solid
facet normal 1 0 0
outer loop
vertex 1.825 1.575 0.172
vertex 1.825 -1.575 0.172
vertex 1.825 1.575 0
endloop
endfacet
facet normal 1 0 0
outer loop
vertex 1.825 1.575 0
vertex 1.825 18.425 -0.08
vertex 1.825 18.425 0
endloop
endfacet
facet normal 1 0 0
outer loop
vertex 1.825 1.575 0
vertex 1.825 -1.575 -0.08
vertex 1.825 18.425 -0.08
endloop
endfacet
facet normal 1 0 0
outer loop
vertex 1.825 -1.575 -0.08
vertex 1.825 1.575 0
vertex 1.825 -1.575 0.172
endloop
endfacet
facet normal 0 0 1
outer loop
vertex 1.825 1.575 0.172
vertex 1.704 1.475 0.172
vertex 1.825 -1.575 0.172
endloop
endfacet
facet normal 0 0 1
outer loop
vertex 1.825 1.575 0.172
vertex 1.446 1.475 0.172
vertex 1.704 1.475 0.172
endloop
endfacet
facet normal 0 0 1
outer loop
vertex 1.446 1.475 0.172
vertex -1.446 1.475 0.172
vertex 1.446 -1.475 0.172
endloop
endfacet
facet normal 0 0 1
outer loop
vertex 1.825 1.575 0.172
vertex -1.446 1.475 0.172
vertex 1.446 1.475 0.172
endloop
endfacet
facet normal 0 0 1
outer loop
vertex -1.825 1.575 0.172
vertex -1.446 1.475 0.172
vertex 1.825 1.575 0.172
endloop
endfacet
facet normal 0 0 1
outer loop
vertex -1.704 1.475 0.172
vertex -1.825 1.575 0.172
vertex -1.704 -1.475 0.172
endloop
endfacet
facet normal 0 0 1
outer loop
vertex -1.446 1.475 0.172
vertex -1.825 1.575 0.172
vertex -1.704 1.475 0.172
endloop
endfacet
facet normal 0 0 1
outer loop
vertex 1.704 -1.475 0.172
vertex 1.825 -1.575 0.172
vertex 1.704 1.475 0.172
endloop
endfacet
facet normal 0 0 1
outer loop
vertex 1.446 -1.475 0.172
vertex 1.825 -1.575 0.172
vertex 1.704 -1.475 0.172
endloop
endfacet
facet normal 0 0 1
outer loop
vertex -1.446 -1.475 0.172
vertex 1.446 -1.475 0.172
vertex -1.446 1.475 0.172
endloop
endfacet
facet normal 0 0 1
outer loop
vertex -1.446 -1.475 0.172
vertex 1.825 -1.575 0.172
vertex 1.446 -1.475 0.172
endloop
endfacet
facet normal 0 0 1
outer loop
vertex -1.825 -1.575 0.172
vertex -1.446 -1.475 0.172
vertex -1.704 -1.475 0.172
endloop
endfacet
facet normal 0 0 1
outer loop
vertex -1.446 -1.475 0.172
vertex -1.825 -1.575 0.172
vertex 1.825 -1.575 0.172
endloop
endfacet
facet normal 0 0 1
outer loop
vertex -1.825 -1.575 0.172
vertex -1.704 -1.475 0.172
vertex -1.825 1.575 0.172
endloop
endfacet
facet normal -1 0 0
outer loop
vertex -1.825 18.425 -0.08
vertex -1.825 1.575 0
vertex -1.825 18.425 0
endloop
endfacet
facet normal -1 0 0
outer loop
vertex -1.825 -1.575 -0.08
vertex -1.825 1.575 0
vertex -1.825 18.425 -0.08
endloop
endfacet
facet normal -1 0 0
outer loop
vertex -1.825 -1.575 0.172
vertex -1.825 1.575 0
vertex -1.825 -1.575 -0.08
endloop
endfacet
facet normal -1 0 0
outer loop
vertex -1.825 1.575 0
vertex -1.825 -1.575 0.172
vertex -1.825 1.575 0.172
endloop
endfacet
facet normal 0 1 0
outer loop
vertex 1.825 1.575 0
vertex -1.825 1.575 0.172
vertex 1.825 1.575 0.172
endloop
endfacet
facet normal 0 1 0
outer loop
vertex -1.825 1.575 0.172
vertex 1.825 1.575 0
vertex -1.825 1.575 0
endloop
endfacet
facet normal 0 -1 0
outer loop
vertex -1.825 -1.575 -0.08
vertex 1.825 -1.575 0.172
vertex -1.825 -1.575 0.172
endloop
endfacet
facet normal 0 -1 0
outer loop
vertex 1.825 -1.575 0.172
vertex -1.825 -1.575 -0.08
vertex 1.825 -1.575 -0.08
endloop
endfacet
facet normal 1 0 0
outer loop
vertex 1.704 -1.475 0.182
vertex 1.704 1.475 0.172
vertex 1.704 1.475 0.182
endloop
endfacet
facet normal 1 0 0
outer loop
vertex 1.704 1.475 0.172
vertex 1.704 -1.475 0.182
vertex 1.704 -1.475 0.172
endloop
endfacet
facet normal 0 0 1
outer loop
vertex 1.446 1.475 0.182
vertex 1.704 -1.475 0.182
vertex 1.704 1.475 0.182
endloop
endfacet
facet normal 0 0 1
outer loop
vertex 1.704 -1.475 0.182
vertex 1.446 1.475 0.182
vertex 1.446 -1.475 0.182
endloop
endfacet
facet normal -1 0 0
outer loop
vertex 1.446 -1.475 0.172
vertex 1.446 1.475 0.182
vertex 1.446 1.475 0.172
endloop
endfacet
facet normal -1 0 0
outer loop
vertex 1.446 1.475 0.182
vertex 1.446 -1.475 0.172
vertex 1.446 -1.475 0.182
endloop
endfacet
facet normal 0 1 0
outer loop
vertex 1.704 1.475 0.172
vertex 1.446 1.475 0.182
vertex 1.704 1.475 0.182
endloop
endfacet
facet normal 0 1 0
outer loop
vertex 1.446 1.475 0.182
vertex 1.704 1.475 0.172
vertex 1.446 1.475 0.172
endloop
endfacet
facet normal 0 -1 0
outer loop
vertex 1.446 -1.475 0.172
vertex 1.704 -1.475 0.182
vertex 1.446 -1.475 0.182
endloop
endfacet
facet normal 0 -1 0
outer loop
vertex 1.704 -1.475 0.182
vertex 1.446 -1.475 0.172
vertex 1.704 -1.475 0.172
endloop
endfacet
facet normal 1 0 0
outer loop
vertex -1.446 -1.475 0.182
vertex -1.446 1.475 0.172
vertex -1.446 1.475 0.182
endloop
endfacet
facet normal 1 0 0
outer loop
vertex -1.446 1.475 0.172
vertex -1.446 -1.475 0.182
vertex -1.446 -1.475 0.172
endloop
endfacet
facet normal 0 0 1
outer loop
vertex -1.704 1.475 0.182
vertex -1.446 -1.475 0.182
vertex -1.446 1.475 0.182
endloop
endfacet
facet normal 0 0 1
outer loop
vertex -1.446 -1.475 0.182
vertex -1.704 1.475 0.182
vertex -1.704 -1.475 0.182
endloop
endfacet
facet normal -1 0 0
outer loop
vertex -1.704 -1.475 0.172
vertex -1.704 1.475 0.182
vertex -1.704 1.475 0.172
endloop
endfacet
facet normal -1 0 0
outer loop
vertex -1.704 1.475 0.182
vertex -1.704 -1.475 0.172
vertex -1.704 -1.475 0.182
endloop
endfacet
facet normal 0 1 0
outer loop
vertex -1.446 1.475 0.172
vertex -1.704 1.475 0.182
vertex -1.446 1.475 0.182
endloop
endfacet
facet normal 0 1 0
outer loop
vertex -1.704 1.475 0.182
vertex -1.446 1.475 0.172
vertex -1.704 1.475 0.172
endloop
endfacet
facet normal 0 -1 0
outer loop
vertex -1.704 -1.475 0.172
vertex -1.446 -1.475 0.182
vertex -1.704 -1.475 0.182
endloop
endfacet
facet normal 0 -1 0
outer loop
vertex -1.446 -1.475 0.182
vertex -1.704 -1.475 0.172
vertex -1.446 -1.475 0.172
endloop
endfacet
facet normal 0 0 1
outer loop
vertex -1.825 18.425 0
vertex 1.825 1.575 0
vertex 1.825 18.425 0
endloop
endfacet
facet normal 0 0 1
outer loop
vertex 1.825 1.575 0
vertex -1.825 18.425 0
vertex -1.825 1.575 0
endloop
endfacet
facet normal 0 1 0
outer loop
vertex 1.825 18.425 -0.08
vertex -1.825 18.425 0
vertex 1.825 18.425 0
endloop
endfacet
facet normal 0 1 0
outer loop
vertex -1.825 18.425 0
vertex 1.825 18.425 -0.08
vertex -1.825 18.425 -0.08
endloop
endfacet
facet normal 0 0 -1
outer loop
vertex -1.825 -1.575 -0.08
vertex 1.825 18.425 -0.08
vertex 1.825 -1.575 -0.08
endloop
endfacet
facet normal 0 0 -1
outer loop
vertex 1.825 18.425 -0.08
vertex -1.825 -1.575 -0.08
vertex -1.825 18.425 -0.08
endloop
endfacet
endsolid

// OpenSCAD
cellx = 3.65;
celly = 3.15;
cellz = 0.17;
busbarx = 0.2577; // width of busbars
busbarspan = 3.15; // distance between busbars
polyimide = 0.045; // thickness of insulator (200kv/mm)
copper = 0.035; // thickness of copper
solder = 0.0025; // thickness of solder

translate([cellx*-0.5,celly*-0.5,solder-0.00001]) color("blue") cube(size = [cellx,celly,cellz]); // cell body
translate([busbarspan*0.5-busbarx*0.5,celly*-0.5+0.1,solder+0.01]) cube(size = [busbarx,celly-0.2,cellz]); // busbar
translate([busbarspan*-0.5-busbarx*0.5,celly*-0.5+0.1,solder+0.01]) cube(size = [busbarx,celly-0.2,cellz]); // busbar
translate([cellx*-0.5,celly*-0.5,0]) color("silver") cube(size = [cellx,celly,solder]); // solder layer
translate([cellx*-0.5,celly*-0.5,-1*copper]) color("goldenrod") cube(size = [cellx,20,copper]); // back copper
translate([cellx*-0.5,celly*-0.5,-1*(copper+polyimide)]) color("sienna") cube(size = [cellx,20,polyimide]); // back polyimide
